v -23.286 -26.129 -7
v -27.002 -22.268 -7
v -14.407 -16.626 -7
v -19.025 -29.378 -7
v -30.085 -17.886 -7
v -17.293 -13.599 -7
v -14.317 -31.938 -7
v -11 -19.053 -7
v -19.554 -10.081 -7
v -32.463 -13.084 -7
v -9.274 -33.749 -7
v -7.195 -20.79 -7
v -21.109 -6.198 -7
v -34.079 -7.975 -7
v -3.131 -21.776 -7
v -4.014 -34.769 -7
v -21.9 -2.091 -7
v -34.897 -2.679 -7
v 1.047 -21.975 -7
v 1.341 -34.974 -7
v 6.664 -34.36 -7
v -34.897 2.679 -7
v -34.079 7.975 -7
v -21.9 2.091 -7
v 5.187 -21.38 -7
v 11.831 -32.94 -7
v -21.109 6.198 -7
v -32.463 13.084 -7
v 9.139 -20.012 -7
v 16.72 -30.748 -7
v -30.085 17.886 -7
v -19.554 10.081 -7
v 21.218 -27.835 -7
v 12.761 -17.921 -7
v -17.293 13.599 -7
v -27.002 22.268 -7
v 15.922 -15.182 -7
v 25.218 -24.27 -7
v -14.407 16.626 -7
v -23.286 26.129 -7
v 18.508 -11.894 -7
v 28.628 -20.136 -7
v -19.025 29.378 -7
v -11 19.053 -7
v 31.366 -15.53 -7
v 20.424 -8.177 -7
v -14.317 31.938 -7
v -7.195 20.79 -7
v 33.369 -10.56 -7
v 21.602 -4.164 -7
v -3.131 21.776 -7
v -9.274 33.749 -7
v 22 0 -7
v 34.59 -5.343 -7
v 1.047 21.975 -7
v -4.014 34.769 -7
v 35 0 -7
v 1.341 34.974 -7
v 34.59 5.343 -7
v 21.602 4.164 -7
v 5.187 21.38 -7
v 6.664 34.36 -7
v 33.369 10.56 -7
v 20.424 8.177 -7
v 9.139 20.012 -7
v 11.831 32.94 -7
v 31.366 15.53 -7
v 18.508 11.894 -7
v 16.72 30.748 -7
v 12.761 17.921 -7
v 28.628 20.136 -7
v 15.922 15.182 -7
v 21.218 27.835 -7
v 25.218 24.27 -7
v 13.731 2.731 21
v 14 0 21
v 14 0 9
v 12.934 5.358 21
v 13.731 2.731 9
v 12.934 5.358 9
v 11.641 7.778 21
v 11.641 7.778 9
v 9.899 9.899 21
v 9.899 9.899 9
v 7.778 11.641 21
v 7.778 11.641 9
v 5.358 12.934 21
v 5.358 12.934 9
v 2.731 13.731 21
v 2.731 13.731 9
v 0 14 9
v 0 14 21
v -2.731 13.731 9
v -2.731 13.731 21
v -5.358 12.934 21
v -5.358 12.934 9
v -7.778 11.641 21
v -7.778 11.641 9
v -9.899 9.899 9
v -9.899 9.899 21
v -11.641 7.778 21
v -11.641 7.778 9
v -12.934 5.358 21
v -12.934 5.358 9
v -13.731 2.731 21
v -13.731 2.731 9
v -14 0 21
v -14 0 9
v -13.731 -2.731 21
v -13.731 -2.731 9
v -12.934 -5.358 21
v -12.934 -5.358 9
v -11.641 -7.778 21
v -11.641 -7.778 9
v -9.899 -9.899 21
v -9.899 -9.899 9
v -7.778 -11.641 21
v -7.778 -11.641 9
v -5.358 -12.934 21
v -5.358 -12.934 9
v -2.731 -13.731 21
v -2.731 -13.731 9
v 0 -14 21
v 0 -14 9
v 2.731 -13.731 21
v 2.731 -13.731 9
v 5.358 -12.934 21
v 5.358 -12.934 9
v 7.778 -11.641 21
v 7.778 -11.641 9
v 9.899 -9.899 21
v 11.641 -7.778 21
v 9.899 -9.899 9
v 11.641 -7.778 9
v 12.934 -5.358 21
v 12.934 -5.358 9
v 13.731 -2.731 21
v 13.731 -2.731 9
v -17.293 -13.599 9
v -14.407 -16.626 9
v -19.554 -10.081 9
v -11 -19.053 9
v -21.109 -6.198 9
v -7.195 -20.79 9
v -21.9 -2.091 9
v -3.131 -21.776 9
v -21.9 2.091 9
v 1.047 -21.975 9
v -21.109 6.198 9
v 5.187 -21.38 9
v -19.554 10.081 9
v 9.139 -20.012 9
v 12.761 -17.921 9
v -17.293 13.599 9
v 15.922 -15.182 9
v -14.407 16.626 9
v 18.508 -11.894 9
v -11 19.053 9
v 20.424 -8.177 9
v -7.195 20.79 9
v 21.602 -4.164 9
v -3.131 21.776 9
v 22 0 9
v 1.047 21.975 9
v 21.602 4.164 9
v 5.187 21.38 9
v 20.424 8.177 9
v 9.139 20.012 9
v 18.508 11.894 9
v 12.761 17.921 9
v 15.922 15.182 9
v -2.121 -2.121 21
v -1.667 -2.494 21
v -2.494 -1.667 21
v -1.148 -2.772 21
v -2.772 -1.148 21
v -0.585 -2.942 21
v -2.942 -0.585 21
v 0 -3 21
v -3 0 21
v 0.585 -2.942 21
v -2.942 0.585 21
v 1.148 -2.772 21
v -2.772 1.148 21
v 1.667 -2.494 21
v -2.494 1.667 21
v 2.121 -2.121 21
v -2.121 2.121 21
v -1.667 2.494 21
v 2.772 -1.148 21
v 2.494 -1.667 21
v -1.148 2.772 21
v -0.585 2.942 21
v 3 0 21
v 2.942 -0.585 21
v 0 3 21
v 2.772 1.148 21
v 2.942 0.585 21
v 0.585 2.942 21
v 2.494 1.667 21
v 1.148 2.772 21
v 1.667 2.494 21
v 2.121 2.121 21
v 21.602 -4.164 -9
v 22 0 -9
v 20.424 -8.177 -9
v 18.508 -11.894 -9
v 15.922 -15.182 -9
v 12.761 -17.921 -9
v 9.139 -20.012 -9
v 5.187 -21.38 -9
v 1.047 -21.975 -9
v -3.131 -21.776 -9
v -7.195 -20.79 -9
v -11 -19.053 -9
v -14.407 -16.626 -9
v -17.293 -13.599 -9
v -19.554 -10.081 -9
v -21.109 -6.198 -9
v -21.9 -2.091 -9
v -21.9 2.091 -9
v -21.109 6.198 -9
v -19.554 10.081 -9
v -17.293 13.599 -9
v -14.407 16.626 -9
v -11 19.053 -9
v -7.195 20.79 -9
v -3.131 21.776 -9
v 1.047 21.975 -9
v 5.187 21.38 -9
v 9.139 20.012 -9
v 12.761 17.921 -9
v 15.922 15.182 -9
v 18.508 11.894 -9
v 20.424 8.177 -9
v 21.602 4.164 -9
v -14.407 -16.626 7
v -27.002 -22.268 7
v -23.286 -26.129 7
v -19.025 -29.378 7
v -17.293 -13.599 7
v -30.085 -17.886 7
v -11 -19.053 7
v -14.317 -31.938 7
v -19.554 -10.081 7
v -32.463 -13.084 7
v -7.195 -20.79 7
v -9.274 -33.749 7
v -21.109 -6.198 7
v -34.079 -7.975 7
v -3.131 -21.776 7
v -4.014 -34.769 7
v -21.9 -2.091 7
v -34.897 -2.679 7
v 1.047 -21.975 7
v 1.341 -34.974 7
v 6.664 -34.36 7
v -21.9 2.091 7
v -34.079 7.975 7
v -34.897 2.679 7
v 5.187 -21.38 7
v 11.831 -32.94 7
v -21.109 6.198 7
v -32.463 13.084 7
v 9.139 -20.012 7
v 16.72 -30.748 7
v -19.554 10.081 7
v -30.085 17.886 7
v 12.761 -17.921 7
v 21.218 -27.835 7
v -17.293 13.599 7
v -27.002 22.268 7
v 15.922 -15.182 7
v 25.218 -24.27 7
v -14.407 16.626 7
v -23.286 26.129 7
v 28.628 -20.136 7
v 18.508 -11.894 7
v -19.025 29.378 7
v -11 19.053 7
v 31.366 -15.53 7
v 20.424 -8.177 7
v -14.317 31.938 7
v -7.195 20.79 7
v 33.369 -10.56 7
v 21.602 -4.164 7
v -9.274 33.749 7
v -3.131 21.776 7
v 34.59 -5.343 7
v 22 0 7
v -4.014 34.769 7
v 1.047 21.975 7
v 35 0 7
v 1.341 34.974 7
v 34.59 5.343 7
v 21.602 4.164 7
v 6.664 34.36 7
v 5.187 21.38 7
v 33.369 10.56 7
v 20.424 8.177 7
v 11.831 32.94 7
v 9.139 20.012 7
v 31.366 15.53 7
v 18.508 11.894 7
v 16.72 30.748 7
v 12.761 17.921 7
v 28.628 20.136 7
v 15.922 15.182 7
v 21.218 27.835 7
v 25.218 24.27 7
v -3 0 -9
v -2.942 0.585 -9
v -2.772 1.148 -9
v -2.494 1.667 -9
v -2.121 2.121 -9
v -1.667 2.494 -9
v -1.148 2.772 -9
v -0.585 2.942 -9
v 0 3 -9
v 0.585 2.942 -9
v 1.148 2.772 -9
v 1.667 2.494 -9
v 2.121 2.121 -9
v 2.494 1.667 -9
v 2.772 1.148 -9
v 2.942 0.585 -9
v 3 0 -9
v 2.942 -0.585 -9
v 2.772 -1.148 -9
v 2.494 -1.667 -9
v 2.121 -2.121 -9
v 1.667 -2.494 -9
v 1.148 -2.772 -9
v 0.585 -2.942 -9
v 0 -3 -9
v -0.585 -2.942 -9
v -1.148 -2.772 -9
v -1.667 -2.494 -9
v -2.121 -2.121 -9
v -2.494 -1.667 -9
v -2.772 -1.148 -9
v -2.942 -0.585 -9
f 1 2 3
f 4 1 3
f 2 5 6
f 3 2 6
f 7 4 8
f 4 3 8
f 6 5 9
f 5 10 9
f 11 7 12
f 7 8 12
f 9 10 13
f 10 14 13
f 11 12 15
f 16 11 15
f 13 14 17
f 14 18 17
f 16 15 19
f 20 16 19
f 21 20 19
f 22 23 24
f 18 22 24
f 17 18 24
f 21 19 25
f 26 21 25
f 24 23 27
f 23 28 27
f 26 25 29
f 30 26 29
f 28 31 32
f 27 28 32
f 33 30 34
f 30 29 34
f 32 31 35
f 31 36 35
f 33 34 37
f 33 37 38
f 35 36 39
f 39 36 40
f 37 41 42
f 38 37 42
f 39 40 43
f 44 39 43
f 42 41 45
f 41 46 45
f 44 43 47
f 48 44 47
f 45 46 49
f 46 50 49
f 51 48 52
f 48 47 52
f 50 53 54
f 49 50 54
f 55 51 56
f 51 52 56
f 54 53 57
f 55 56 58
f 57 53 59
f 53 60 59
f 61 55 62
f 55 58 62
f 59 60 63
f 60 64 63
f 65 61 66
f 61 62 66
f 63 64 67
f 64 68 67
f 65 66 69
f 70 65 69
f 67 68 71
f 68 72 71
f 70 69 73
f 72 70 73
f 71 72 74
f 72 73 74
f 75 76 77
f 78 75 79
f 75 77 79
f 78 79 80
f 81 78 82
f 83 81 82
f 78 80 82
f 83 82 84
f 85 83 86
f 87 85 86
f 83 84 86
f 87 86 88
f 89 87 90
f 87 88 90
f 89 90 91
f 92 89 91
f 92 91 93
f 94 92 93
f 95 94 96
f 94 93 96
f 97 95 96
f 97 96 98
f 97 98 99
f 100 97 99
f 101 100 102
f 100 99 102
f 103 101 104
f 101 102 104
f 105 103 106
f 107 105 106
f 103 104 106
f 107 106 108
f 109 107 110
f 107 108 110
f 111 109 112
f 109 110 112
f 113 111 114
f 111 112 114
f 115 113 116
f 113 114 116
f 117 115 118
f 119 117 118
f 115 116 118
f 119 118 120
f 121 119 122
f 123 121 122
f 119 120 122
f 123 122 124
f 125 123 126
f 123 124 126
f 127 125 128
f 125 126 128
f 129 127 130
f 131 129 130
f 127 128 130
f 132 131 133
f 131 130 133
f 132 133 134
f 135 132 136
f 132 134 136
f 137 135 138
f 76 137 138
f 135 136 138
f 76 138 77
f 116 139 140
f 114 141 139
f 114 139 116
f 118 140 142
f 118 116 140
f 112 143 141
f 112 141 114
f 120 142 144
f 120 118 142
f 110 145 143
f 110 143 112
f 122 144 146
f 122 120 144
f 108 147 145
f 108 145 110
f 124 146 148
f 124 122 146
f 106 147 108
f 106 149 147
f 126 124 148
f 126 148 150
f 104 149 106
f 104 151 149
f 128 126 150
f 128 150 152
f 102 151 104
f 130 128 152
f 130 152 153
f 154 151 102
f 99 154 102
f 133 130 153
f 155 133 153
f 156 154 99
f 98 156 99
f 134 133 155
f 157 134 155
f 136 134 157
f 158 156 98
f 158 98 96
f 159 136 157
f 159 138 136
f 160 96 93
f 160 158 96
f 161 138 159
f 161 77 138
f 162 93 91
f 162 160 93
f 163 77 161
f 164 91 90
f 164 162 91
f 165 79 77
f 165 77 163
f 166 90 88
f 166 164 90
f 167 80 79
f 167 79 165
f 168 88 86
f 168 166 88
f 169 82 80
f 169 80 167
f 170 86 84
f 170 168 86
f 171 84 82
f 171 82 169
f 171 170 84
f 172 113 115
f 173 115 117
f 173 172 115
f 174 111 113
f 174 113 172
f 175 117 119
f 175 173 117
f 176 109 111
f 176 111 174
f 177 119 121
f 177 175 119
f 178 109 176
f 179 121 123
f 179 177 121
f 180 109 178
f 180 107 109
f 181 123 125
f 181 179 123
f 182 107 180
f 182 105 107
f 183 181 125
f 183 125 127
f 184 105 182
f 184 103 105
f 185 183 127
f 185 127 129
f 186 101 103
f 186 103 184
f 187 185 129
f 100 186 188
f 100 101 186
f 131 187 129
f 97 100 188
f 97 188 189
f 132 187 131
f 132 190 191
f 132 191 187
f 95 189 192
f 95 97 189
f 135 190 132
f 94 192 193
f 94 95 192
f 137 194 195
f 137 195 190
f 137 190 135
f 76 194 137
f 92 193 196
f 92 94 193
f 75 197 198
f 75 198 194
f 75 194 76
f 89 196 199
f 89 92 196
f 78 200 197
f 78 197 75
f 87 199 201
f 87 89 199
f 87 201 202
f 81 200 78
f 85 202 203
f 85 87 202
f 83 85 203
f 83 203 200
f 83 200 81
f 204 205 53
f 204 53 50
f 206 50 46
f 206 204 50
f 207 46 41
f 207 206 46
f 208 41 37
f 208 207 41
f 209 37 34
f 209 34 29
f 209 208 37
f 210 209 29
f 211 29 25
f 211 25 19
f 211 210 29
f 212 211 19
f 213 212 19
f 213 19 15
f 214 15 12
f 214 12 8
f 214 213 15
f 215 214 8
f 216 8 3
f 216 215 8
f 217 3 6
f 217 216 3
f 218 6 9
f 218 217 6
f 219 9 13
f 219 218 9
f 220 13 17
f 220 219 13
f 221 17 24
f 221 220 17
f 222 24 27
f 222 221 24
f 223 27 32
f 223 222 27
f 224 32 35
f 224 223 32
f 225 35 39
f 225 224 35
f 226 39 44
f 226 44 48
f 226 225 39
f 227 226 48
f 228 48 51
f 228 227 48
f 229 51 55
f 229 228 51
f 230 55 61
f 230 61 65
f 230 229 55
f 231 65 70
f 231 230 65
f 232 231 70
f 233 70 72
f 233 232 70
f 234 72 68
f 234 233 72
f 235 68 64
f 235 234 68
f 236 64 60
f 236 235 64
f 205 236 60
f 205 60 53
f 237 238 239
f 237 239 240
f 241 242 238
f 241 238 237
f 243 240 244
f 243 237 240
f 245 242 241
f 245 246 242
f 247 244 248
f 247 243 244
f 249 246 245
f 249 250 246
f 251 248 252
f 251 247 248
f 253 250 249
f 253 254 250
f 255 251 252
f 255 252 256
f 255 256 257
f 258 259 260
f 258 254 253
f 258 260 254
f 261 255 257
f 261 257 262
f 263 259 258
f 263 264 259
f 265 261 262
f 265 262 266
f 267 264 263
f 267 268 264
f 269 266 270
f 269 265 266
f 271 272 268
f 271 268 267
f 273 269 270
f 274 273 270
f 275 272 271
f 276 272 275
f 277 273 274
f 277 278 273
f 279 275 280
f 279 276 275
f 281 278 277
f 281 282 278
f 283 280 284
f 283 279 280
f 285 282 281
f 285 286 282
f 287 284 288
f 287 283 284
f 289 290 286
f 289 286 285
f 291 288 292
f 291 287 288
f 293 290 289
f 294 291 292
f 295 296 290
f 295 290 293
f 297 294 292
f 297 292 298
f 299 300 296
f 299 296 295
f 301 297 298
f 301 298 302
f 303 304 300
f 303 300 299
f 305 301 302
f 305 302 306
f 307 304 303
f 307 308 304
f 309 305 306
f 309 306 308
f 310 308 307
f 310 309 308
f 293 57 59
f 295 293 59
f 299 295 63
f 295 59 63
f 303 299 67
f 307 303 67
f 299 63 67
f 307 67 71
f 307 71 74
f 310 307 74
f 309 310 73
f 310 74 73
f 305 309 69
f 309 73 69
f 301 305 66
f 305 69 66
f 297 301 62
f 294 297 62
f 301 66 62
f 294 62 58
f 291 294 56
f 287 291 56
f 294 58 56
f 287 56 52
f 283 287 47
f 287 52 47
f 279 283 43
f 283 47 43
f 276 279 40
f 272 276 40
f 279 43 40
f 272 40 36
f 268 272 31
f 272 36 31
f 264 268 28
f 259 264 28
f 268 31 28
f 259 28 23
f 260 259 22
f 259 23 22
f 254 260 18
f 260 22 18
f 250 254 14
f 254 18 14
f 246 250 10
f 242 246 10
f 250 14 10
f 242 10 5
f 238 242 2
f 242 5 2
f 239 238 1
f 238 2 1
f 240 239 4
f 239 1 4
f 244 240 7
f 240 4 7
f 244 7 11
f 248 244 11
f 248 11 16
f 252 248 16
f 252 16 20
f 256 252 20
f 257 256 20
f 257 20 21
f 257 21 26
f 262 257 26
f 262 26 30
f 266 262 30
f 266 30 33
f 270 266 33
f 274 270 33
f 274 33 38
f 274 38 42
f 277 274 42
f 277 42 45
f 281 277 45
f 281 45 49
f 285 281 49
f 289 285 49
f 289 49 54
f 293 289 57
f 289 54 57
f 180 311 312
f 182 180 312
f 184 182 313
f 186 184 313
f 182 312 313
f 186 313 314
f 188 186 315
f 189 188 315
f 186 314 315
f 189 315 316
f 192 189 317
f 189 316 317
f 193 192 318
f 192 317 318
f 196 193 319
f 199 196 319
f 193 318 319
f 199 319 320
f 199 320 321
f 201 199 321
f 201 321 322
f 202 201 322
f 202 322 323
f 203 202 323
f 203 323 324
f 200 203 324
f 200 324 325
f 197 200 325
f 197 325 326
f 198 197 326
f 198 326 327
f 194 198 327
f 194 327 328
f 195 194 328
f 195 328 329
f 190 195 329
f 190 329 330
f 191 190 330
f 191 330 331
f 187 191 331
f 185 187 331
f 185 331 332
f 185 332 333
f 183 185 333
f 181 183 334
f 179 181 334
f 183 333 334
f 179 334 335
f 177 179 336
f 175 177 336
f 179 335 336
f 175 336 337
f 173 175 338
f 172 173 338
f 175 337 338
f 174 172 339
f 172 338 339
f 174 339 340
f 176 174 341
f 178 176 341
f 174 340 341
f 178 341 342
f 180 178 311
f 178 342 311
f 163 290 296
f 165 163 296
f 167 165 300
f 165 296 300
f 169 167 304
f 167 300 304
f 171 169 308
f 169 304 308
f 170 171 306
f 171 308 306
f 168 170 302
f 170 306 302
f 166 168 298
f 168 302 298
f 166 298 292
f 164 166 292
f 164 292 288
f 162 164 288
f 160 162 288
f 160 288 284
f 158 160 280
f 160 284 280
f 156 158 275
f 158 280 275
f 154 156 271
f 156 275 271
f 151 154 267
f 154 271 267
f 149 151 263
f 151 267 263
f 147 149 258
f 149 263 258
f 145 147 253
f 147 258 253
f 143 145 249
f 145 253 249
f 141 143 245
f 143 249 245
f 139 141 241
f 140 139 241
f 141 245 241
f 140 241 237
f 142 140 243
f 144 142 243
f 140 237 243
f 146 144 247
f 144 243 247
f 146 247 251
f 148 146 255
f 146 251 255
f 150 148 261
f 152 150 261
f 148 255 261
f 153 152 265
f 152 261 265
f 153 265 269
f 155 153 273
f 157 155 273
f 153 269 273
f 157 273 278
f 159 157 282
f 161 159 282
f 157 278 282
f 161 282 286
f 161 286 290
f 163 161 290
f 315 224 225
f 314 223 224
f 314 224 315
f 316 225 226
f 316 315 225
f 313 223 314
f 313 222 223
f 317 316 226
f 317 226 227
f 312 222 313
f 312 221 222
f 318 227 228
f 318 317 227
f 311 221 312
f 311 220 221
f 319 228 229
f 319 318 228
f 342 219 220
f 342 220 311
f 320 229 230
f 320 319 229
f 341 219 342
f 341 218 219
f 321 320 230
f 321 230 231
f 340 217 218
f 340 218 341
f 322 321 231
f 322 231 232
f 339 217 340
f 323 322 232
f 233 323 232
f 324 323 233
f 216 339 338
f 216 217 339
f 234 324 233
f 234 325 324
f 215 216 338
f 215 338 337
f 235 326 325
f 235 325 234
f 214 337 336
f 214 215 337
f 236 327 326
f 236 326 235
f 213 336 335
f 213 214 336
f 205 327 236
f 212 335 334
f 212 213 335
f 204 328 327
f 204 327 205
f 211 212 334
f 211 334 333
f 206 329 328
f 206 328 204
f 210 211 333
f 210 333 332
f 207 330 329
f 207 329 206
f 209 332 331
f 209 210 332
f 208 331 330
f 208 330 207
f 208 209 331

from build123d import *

# Parameters (mm, degrees)
BOSS_EXTRU_1_DEPTH      = 7
BOSS_EXTRU_1_DEPTH_BACK = 7
ESQUISSE1_R             = 35
ESQUISSE2_R             = 22
BOSS_EXTRU_2_DEPTH      = 2
BOSS_EXTRU_3_START      = 2
ESQUISSE3_R             = 22
BOSS_EXTRU_3_DEPTH      = 2
ESQUISSE4_R             = 14
BOSS_EXTRU_4_DEPTH      = 12
ESQUISSE5_R             = 3
ENL_V_MAT_EXTRU_1_DEPTH = 59


with BuildPart() as part:
    # Esquisse1 → Boss.-Extru.1 (new, two sides: drawn at the far end of the back side and taken through both)
    with BuildSketch(Plane.XY.offset(-BOSS_EXTRU_1_DEPTH_BACK)):
        Circle(ESQUISSE1_R)
    extrude(amount=BOSS_EXTRU_1_DEPTH + BOSS_EXTRU_1_DEPTH_BACK)

    # Esquisse2 → Boss.-Extru.2 (add)
    with BuildSketch(Plane.XY.offset(7)):
        Circle(ESQUISSE2_R)
    extrude(amount=BOSS_EXTRU_2_DEPTH)

    # Esquisse3 → Boss.-Extru.3 (add)
    with BuildSketch(Plane(origin=(0, 0, -7), x_dir=(-1, 0, 0), z_dir=(0, 0, -1)).offset(BOSS_EXTRU_3_START)):
        Circle(ESQUISSE3_R)
    extrude(amount=-BOSS_EXTRU_3_DEPTH)

    # Esquisse4 → Boss.-Extru.4 (add)
    with BuildSketch(Plane.XY.offset(9)):
        Circle(ESQUISSE4_R)
    extrude(amount=BOSS_EXTRU_4_DEPTH)

    # Esquisse5 → Enlèv. mat.-Extru.1 (cut)
    with BuildSketch(Plane(origin=(0, 0, -9), x_dir=(-1, 0, 0), z_dir=(0, 0, -1))):
        Circle(ESQUISSE5_R)
    extrude(amount=-ENL_V_MAT_EXTRU_1_DEPTH, mode=Mode.SUBTRACT)


solid = part.part
